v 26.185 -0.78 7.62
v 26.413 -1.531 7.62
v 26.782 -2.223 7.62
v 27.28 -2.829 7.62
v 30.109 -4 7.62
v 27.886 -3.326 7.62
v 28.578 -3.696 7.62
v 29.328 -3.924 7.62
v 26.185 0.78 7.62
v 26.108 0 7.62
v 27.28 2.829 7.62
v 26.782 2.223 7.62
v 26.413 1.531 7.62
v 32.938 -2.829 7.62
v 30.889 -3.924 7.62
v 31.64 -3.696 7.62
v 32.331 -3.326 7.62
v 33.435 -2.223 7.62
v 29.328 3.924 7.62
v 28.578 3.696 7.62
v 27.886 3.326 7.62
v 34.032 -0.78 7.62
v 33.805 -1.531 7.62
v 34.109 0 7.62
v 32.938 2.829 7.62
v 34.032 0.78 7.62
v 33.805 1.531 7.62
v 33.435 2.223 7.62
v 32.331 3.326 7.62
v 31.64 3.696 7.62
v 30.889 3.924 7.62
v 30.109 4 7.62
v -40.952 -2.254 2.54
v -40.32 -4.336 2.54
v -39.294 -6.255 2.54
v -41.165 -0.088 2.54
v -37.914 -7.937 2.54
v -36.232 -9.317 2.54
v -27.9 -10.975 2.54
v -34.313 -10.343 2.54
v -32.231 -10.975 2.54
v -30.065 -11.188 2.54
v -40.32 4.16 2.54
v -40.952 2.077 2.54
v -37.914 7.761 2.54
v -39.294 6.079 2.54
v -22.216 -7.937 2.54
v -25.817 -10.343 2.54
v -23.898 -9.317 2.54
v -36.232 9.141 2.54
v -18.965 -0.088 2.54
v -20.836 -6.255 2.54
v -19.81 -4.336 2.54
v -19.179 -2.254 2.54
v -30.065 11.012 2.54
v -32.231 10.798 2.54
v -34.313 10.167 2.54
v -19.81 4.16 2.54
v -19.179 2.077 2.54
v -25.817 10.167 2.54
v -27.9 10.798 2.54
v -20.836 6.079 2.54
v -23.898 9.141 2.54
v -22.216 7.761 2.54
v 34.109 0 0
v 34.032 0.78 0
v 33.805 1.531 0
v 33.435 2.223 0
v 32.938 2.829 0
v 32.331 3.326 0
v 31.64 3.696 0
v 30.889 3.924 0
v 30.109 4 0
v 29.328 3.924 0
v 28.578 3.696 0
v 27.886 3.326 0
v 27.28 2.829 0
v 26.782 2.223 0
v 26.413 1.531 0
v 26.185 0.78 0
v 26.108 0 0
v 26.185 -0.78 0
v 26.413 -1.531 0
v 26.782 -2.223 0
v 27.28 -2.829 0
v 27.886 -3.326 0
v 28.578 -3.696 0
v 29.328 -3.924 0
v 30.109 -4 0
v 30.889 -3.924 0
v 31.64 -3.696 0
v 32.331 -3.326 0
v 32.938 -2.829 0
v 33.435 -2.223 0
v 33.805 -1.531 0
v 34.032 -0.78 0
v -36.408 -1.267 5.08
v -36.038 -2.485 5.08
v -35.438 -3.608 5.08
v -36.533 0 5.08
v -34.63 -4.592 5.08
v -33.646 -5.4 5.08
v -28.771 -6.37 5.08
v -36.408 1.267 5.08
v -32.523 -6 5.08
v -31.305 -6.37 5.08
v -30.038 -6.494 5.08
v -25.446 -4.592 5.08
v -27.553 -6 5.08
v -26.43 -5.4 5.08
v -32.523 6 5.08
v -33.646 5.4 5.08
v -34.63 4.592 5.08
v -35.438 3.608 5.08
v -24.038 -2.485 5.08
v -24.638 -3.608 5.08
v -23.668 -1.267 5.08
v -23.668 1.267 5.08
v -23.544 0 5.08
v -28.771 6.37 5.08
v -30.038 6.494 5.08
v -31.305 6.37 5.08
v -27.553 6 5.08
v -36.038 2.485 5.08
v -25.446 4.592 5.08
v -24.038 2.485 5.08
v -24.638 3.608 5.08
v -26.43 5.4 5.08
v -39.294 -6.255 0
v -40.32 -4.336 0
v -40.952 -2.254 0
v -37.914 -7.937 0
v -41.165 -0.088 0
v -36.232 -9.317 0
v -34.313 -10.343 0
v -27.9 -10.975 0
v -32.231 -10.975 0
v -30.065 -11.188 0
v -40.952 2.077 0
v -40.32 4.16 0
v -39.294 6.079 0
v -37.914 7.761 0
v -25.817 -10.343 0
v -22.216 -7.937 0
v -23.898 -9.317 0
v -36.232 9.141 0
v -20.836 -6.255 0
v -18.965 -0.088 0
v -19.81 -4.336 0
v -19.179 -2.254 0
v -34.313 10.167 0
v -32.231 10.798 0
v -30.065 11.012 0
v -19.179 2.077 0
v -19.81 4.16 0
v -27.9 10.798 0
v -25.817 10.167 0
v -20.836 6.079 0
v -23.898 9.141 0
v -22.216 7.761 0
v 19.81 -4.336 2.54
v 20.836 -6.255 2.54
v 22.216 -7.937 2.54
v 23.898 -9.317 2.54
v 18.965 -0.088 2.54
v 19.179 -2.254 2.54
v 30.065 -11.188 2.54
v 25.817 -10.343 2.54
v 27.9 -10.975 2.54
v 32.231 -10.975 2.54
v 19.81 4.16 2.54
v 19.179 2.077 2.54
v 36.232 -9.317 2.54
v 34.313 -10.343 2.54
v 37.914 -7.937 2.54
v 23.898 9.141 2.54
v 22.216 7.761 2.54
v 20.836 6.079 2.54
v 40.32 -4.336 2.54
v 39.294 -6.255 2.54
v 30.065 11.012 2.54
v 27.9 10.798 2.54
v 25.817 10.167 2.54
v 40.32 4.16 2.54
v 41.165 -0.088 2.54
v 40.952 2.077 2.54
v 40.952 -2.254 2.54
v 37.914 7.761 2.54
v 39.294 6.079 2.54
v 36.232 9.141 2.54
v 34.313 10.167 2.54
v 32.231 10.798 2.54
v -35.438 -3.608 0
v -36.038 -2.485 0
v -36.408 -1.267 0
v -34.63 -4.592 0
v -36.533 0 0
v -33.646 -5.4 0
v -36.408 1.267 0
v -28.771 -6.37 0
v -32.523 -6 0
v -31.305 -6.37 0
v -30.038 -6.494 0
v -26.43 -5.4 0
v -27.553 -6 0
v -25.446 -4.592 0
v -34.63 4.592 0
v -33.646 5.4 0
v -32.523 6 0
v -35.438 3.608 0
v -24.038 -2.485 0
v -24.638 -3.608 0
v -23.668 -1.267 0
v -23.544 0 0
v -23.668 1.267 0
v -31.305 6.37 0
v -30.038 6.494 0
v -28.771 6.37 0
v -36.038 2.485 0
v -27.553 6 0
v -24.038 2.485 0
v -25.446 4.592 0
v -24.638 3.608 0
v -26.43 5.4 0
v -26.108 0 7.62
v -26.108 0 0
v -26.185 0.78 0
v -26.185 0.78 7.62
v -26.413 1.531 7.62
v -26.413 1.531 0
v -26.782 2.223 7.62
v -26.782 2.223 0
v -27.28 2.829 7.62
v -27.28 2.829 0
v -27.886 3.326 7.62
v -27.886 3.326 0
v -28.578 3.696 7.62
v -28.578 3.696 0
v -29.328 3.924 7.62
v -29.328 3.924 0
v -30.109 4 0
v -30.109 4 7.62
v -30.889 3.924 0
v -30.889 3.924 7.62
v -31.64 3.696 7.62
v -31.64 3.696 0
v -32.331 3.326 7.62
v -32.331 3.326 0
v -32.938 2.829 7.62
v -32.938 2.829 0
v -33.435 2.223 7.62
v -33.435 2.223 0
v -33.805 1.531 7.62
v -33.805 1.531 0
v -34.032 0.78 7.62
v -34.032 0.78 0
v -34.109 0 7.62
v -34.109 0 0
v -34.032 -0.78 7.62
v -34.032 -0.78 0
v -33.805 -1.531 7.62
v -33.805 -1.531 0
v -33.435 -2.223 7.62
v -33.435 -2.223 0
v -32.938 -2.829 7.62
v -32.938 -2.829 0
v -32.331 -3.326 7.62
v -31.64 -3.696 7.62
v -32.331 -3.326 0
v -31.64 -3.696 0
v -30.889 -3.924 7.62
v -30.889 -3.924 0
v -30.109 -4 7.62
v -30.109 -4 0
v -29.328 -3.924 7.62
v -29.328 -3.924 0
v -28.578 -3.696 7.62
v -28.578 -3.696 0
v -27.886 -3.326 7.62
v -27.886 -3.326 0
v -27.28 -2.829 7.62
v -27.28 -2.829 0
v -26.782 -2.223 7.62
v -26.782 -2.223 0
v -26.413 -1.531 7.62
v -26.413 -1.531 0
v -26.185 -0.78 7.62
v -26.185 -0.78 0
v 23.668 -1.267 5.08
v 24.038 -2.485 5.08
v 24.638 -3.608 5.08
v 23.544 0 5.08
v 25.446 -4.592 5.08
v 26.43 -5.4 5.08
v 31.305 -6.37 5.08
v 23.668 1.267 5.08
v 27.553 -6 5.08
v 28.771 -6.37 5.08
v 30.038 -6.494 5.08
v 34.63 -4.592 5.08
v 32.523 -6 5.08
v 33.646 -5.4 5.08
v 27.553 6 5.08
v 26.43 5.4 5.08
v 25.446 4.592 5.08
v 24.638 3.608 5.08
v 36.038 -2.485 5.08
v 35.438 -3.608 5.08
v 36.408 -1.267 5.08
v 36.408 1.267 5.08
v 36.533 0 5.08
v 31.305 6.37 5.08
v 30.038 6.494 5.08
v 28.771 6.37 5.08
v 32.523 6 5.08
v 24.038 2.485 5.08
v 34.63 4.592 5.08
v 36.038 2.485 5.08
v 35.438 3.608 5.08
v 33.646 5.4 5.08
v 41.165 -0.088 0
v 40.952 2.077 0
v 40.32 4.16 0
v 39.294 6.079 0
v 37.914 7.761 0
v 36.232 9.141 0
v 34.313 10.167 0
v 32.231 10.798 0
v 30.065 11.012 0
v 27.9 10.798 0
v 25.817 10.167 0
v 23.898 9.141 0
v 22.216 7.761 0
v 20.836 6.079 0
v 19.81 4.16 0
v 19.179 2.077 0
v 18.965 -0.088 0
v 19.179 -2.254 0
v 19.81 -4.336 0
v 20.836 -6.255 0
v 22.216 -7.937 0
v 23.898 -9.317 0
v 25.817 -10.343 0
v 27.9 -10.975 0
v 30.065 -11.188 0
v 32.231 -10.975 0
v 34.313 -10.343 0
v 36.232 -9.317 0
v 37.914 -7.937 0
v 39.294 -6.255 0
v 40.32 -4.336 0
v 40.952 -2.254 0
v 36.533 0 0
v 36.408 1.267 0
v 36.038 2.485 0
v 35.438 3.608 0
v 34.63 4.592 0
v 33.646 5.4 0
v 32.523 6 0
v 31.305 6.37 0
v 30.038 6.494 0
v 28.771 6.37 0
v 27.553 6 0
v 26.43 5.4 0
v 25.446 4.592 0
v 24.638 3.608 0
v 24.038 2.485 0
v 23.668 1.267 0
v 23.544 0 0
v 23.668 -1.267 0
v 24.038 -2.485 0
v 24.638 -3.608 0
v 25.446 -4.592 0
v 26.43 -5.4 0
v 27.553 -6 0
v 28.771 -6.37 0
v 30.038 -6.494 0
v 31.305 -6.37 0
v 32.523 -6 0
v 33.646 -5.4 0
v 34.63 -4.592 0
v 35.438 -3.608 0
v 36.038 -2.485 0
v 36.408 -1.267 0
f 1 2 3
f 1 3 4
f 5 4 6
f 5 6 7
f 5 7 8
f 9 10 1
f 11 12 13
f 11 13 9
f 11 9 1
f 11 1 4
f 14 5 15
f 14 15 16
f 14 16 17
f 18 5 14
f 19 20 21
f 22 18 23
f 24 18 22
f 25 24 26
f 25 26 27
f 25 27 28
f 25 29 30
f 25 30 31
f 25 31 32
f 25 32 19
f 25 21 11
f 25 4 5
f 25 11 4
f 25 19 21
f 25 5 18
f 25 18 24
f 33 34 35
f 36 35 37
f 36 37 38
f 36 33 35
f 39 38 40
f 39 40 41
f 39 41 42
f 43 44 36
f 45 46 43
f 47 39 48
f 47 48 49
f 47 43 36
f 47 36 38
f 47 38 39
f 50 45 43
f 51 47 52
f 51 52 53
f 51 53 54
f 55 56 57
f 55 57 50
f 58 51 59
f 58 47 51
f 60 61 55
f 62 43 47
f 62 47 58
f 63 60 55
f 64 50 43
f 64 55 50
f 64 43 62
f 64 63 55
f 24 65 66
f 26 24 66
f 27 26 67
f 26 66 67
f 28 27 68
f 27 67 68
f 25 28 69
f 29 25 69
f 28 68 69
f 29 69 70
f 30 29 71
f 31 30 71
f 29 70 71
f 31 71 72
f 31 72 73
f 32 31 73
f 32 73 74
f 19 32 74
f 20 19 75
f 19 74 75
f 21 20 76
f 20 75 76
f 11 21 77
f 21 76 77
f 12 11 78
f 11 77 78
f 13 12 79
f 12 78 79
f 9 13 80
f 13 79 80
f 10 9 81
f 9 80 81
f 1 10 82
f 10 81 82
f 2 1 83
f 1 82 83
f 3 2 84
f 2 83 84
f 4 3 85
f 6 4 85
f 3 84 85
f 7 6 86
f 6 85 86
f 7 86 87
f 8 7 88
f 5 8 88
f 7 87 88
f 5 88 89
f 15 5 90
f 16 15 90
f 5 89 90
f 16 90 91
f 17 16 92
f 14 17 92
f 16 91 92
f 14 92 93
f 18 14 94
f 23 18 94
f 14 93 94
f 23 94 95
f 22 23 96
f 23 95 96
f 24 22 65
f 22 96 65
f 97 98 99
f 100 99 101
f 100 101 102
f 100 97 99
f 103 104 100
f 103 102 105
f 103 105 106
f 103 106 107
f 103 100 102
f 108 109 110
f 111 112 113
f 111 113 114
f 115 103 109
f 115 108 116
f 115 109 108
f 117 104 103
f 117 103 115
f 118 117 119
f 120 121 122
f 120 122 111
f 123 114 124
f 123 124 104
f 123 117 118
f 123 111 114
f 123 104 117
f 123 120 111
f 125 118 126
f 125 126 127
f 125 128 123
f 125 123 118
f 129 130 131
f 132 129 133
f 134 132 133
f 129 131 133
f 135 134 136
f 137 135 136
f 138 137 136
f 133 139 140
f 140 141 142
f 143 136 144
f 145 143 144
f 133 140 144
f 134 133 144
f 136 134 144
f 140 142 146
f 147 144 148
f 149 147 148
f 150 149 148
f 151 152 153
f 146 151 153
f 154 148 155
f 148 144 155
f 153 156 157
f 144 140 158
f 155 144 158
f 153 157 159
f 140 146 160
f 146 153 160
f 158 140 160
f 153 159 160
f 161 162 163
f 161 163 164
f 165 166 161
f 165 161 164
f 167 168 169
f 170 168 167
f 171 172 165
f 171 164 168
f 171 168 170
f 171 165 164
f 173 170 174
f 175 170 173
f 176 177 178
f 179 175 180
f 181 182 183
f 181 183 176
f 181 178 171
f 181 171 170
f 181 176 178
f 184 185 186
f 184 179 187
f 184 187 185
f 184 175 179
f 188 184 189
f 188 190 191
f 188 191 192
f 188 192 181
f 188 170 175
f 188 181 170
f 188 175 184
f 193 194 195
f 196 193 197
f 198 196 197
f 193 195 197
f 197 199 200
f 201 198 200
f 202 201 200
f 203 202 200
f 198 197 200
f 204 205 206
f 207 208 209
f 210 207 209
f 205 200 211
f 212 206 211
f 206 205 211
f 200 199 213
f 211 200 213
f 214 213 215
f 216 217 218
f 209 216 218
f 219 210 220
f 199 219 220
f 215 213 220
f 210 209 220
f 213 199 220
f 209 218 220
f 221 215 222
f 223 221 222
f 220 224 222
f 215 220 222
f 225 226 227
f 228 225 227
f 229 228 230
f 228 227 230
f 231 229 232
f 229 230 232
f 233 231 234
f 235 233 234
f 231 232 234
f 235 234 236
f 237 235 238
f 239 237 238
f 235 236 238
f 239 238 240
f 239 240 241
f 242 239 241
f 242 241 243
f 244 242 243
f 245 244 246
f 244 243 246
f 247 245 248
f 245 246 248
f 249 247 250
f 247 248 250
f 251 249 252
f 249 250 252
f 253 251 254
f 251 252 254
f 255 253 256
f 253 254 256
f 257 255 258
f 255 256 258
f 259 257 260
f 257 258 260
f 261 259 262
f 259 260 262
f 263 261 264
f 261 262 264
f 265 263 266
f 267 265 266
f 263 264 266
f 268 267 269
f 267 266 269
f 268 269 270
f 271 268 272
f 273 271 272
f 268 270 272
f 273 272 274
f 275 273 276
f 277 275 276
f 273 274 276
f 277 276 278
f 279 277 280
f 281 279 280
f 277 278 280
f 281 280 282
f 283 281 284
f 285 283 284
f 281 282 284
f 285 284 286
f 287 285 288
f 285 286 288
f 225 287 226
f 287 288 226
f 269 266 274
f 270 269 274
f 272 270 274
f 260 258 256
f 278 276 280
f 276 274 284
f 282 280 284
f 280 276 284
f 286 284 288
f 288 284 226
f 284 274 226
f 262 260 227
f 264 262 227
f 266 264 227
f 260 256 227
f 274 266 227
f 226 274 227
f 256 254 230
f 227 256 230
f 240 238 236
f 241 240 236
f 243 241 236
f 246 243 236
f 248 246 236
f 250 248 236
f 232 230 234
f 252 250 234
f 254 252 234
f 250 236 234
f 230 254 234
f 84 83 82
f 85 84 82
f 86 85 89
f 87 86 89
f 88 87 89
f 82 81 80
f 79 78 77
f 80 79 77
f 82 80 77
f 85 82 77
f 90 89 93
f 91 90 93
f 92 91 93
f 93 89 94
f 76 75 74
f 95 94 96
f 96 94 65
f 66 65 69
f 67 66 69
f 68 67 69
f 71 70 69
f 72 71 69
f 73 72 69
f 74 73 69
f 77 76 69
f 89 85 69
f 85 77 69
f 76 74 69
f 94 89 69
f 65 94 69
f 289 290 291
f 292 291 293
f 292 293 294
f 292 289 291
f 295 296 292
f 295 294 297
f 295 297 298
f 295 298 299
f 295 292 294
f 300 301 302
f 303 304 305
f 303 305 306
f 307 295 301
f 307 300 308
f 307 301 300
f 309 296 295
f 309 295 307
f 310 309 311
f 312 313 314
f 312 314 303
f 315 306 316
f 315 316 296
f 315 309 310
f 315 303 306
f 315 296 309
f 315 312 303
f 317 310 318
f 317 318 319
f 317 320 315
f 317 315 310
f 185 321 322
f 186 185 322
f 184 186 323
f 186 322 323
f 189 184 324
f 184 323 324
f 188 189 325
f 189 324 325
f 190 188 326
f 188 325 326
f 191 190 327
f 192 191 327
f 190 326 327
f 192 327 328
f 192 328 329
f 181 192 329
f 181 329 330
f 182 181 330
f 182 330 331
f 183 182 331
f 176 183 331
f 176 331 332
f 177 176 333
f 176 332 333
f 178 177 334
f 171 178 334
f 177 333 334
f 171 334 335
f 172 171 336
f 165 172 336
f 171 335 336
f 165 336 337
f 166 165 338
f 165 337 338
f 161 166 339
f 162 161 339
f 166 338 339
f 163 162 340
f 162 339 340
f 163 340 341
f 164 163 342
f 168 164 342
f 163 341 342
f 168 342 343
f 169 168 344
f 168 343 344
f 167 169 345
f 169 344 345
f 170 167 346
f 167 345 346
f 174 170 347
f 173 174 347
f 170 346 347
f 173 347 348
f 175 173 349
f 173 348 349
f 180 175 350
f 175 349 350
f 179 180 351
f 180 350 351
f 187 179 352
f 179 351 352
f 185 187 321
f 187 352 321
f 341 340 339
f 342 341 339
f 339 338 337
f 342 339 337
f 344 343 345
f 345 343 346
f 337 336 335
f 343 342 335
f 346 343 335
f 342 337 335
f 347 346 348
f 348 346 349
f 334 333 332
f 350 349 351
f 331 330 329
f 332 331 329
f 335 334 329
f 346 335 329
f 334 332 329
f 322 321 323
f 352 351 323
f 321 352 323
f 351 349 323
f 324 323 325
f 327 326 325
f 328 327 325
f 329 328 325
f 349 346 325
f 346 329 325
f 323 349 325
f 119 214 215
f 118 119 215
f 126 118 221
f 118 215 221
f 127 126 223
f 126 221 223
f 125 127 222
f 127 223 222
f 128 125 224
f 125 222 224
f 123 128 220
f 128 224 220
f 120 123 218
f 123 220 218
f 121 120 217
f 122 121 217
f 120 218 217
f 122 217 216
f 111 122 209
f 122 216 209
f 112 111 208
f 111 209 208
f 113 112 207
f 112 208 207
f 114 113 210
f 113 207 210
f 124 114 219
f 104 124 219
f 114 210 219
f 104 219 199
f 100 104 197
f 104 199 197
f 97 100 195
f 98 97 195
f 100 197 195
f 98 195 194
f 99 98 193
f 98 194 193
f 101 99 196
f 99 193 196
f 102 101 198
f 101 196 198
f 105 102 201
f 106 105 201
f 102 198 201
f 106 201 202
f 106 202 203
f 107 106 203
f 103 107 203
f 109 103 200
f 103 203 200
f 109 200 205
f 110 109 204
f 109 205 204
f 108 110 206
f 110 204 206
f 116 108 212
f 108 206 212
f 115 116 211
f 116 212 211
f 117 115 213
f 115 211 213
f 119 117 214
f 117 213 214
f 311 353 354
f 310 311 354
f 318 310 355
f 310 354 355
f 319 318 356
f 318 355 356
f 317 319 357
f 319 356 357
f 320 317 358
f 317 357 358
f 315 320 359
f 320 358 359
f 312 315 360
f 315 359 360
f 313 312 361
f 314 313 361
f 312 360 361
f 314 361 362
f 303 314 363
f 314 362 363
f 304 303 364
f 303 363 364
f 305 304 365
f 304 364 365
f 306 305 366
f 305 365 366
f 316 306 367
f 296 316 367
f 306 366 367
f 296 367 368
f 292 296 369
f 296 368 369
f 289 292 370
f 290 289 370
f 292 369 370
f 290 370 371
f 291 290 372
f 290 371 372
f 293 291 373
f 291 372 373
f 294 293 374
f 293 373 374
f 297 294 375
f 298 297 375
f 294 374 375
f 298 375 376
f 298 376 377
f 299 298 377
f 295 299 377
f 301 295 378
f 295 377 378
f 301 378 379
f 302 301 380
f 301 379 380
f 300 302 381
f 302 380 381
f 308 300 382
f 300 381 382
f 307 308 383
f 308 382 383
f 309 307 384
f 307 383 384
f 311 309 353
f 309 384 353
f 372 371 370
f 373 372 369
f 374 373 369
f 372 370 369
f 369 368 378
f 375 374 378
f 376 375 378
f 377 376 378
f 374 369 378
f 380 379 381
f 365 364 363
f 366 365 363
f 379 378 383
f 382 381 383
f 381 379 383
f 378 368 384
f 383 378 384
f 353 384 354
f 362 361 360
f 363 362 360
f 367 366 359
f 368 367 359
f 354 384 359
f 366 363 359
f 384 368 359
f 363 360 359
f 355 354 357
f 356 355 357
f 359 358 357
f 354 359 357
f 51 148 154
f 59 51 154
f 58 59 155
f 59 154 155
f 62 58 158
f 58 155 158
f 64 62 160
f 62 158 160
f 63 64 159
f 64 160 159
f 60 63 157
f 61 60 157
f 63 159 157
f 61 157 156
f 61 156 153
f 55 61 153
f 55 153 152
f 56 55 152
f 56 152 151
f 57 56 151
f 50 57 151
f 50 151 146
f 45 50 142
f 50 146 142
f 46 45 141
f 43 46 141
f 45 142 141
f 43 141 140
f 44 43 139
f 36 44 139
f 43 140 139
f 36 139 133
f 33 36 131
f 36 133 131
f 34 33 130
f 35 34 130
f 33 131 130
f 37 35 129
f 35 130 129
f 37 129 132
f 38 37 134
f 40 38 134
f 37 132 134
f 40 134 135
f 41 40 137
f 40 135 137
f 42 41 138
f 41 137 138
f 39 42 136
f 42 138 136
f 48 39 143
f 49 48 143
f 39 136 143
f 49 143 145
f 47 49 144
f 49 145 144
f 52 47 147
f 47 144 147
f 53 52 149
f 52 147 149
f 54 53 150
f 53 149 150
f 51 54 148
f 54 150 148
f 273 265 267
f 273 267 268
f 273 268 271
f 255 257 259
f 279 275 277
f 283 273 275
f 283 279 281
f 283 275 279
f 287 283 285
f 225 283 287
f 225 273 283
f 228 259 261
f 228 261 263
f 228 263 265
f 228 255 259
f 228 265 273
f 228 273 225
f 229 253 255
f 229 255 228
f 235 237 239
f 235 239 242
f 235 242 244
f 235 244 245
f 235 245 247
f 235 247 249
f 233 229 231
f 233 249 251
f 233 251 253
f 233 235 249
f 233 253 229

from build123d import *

# Parameters (mm, degrees)
F0_R     = 11.0998
F1_DEPTH = 2.54
F2_R     = 6.494404
F3_DEPTH = 5.08
F4_R     = 4.0005
F5_DEPTH = 7.62


with BuildPart() as f1:
    # F0 (on Top) → F1 (new body)
    with BuildSketch(Plane.XY):
        with Locations((-30.065172, -0.088068)):
            Circle(F0_R)
        with Locations((30.065172, -0.088068)):
            Circle(F0_R)
    extrude(amount=F1_DEPTH)


with BuildPart() as f3:
    # F2 (on Top) → F3 (new body)
    with BuildSketch(Plane.XY):
        with Locations((-30.038102, 0)):
            Circle(F2_R)
        with Locations((30.038102, 0)):
            Circle(F2_R)
    extrude(amount=F3_DEPTH)


with BuildPart() as f5:
    # F4 (on Top) → F5 (new body)
    with BuildSketch(Plane.XY):
        with Locations((-30.108766, 0)):
            Circle(F4_R)
        with Locations((30.108766, 0)):
            Circle(F4_R)
    extrude(amount=F5_DEPTH)


solid = Compound([f1.part, f3.part, f5.part])
